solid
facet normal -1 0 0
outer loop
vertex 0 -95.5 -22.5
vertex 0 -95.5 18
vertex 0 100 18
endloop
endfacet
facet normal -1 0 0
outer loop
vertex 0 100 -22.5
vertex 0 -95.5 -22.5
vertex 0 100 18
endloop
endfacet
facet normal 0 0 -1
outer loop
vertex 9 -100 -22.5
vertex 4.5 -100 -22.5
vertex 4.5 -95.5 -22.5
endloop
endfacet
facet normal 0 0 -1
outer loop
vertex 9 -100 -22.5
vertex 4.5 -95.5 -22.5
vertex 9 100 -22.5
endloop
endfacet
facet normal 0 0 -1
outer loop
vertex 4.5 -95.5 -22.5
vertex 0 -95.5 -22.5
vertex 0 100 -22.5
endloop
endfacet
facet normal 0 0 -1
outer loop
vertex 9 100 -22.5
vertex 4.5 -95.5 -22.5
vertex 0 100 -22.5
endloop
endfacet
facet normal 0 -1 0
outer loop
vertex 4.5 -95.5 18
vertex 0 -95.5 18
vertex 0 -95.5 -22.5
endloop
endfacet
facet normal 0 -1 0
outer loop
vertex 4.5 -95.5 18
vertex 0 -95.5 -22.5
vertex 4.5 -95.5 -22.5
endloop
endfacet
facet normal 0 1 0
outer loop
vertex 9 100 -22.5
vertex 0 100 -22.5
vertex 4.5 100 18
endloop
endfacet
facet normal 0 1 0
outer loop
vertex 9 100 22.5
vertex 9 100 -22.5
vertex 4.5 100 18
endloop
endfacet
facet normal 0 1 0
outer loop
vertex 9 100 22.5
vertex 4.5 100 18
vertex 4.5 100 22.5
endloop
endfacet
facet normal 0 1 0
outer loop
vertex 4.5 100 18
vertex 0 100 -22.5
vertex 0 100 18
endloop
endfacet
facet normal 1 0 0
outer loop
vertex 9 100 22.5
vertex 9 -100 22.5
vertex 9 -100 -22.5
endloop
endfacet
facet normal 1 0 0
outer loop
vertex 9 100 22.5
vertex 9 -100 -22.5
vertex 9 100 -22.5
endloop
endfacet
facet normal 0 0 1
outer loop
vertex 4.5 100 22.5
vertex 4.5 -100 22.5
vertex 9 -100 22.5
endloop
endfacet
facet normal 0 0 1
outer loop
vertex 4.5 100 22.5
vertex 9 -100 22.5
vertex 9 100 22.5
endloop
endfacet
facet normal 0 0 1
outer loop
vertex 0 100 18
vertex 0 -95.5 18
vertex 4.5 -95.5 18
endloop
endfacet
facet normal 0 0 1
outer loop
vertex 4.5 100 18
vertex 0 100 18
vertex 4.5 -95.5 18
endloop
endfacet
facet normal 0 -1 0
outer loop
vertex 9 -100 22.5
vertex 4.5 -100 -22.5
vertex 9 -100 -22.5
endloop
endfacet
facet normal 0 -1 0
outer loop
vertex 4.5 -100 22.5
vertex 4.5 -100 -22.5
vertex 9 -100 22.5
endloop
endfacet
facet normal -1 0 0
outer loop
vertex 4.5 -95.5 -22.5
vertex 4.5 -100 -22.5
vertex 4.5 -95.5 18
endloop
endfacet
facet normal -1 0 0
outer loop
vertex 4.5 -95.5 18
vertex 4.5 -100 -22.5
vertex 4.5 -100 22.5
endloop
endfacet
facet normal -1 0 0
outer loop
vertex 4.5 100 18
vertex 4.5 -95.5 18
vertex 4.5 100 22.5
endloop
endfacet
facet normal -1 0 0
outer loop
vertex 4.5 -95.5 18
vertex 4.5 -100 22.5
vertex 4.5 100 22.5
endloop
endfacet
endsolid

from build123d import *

# Parameters (mm, degrees)
F0_W     = 200
F0_H     = 45
F1_DEPTH = 9
F2_W     = 4.5
F2_H     = 4.5
F3_DEPTH = 200.001
F4_W     = 4.5
F4_H     = 4.5
F5_DEPTH = 40.501


with BuildPart() as f1:
    # F0 (on Right) → F1 (new body)
    with BuildSketch(Plane.YZ):
        Rectangle(F0_W, F0_H)
    extrude(amount=F1_DEPTH)

    # F2 (on face) → F3 (cut, through all)
    with BuildSketch(Plane.XZ.offset(100)):
        with Locations((2.25, 20.25)):
            Rectangle(F2_W, F2_H)
    extrude(amount=-F3_DEPTH, mode=Mode.SUBTRACT)

    # F4 (on face) → F5 (cut, through all)
    with BuildSketch(Plane.XY.offset(18)):
        with Locations((2.25, -97.75)):
            Rectangle(F4_W, F4_H)
    extrude(amount=-F5_DEPTH, mode=Mode.SUBTRACT)


solid = f1.part
